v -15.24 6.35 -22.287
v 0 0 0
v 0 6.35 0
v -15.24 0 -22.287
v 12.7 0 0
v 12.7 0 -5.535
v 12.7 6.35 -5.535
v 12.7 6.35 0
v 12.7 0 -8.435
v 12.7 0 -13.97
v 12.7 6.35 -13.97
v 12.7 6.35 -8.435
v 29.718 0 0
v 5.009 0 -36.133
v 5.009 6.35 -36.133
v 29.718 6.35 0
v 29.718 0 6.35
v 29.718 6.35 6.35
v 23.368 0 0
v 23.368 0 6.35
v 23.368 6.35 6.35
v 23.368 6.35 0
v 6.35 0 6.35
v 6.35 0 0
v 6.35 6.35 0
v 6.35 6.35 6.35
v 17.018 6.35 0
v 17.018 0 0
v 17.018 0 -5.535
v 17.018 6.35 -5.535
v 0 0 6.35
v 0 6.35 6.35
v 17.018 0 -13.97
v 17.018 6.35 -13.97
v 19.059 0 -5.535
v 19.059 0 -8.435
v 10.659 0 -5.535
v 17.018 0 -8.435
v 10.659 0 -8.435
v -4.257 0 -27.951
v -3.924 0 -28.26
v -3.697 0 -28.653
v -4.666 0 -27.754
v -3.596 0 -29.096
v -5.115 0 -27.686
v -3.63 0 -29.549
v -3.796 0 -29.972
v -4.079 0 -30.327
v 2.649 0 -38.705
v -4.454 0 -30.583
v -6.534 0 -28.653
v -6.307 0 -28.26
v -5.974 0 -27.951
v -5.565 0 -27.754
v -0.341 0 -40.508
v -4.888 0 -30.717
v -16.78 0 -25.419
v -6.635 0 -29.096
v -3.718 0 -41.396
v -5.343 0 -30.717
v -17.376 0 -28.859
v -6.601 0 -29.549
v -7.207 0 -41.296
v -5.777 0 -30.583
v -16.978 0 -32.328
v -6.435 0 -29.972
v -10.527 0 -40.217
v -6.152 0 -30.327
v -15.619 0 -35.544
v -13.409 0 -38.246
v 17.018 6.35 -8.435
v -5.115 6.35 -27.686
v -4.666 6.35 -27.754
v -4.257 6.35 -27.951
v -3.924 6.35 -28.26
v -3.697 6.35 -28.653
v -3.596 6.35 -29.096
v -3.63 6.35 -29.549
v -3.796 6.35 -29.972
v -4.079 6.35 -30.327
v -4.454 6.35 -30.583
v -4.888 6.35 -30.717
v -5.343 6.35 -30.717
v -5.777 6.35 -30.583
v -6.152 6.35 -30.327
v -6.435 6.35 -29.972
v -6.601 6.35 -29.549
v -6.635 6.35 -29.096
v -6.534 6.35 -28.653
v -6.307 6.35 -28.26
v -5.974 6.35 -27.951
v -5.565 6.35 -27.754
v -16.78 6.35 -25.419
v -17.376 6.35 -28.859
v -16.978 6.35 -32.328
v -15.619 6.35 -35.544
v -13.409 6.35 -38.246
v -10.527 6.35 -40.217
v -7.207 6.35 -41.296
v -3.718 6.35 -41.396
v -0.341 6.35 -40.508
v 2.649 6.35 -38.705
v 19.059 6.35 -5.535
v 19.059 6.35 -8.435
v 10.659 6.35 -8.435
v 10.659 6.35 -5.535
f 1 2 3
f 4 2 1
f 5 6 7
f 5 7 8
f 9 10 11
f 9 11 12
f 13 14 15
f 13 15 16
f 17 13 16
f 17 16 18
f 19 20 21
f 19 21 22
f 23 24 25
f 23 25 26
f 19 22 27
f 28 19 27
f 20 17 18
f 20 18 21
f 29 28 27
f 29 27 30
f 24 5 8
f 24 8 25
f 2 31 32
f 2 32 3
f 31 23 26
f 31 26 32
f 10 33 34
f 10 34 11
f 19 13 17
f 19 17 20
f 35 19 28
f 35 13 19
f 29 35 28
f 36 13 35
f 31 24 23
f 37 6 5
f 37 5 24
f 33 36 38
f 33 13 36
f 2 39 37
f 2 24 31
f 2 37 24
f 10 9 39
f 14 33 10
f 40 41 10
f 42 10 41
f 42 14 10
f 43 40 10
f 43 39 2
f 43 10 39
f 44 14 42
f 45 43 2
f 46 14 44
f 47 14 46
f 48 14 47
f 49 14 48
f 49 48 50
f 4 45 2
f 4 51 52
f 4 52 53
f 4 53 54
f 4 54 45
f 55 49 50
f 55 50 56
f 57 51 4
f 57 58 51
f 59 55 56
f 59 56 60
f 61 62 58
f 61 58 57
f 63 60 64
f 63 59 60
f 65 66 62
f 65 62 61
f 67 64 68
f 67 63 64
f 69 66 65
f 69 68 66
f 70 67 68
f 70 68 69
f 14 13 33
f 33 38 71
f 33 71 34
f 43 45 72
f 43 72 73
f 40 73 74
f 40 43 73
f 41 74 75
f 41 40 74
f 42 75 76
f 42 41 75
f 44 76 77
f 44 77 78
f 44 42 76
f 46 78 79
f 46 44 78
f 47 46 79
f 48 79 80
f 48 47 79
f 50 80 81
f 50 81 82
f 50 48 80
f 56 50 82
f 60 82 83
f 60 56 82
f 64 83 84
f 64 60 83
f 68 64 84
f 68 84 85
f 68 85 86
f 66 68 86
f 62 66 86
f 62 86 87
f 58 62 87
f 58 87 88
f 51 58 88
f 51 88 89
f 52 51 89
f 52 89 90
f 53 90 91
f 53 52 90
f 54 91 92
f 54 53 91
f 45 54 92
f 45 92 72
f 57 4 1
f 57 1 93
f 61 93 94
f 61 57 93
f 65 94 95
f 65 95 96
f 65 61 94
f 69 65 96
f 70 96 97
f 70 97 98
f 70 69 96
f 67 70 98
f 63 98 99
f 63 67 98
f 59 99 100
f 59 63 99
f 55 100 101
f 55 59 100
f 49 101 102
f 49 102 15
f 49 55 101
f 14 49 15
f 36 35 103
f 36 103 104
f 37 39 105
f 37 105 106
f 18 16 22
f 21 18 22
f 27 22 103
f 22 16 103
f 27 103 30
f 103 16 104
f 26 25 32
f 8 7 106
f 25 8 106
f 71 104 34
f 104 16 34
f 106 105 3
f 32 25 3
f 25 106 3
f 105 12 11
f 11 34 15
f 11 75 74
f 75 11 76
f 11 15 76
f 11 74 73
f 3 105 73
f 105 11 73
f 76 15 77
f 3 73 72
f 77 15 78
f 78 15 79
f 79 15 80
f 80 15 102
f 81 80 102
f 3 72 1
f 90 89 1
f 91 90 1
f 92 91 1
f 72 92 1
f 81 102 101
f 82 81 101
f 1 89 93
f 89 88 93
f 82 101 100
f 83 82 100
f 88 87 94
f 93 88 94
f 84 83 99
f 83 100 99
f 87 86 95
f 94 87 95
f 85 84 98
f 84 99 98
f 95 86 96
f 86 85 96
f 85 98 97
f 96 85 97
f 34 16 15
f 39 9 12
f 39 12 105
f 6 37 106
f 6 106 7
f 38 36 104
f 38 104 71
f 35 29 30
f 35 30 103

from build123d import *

# Parameters (mm, degrees)
SKETCH1_R           = 1.524
BOSS_EXTRUDE1_DEPTH = 6.35


with BuildPart() as part:
    # Sketch1 → Boss-Extrude1 (new body)
    with BuildSketch(Plane(origin=(0, 0, 0), x_dir=(1, 0, 0), z_dir=(0, 1, 0))):
        with BuildLine():
            Line((-15.24, 22.286579861), (0, 0))
            Line((0, 0), (0, -6.35))
            Line((0, -6.35), (6.35, -6.35))
            Line((6.35, -6.35), (6.35, 0))
            Line((6.35, 0), (12.7, 0))
            Line((12.7, 0), (12.7, 5.534999979))
            Line((12.7, 5.534999979), (10.659000018, 5.534999979))
            Line((10.659000018, 5.534999979), (10.659000018, 8.435000021))
            Line((10.659000018, 8.435000021), (12.7, 8.435000021))
            Line((12.7, 8.435000021), (12.7, 13.97))
            Line((12.7, 13.97), (17.018, 13.97))
            Line((17.018, 13.97), (17.018, 8.435000021))
            Line((17.018, 8.435000021), (19.058999982, 8.435000021))
            Line((19.058999982, 8.435000021), (19.058999982, 5.534999979))
            Line((19.058999982, 5.534999979), (17.018, 5.534999979))
            Line((17.018, 5.534999979), (17.018, 0))
            Line((17.018, 0), (23.368, 0))
            Line((23.368, 0), (23.368, -6.35))
            Line((23.368, -6.35), (29.718, -6.35))
            Line((29.718, -6.35), (29.718, 0))
            Line((29.718, 0), (5.009259297, 36.133420139))
            ThreePointArc((5.009259297, 36.133420139), (-12.038790491, 39.334629649), (-15.24, 22.286579861))
        make_face()
        with Locations((-5.115370351, 29.21)):
            Circle(SKETCH1_R, mode=Mode.SUBTRACT)
    extrude(amount=BOSS_EXTRUDE1_DEPTH)


solid = part.part
